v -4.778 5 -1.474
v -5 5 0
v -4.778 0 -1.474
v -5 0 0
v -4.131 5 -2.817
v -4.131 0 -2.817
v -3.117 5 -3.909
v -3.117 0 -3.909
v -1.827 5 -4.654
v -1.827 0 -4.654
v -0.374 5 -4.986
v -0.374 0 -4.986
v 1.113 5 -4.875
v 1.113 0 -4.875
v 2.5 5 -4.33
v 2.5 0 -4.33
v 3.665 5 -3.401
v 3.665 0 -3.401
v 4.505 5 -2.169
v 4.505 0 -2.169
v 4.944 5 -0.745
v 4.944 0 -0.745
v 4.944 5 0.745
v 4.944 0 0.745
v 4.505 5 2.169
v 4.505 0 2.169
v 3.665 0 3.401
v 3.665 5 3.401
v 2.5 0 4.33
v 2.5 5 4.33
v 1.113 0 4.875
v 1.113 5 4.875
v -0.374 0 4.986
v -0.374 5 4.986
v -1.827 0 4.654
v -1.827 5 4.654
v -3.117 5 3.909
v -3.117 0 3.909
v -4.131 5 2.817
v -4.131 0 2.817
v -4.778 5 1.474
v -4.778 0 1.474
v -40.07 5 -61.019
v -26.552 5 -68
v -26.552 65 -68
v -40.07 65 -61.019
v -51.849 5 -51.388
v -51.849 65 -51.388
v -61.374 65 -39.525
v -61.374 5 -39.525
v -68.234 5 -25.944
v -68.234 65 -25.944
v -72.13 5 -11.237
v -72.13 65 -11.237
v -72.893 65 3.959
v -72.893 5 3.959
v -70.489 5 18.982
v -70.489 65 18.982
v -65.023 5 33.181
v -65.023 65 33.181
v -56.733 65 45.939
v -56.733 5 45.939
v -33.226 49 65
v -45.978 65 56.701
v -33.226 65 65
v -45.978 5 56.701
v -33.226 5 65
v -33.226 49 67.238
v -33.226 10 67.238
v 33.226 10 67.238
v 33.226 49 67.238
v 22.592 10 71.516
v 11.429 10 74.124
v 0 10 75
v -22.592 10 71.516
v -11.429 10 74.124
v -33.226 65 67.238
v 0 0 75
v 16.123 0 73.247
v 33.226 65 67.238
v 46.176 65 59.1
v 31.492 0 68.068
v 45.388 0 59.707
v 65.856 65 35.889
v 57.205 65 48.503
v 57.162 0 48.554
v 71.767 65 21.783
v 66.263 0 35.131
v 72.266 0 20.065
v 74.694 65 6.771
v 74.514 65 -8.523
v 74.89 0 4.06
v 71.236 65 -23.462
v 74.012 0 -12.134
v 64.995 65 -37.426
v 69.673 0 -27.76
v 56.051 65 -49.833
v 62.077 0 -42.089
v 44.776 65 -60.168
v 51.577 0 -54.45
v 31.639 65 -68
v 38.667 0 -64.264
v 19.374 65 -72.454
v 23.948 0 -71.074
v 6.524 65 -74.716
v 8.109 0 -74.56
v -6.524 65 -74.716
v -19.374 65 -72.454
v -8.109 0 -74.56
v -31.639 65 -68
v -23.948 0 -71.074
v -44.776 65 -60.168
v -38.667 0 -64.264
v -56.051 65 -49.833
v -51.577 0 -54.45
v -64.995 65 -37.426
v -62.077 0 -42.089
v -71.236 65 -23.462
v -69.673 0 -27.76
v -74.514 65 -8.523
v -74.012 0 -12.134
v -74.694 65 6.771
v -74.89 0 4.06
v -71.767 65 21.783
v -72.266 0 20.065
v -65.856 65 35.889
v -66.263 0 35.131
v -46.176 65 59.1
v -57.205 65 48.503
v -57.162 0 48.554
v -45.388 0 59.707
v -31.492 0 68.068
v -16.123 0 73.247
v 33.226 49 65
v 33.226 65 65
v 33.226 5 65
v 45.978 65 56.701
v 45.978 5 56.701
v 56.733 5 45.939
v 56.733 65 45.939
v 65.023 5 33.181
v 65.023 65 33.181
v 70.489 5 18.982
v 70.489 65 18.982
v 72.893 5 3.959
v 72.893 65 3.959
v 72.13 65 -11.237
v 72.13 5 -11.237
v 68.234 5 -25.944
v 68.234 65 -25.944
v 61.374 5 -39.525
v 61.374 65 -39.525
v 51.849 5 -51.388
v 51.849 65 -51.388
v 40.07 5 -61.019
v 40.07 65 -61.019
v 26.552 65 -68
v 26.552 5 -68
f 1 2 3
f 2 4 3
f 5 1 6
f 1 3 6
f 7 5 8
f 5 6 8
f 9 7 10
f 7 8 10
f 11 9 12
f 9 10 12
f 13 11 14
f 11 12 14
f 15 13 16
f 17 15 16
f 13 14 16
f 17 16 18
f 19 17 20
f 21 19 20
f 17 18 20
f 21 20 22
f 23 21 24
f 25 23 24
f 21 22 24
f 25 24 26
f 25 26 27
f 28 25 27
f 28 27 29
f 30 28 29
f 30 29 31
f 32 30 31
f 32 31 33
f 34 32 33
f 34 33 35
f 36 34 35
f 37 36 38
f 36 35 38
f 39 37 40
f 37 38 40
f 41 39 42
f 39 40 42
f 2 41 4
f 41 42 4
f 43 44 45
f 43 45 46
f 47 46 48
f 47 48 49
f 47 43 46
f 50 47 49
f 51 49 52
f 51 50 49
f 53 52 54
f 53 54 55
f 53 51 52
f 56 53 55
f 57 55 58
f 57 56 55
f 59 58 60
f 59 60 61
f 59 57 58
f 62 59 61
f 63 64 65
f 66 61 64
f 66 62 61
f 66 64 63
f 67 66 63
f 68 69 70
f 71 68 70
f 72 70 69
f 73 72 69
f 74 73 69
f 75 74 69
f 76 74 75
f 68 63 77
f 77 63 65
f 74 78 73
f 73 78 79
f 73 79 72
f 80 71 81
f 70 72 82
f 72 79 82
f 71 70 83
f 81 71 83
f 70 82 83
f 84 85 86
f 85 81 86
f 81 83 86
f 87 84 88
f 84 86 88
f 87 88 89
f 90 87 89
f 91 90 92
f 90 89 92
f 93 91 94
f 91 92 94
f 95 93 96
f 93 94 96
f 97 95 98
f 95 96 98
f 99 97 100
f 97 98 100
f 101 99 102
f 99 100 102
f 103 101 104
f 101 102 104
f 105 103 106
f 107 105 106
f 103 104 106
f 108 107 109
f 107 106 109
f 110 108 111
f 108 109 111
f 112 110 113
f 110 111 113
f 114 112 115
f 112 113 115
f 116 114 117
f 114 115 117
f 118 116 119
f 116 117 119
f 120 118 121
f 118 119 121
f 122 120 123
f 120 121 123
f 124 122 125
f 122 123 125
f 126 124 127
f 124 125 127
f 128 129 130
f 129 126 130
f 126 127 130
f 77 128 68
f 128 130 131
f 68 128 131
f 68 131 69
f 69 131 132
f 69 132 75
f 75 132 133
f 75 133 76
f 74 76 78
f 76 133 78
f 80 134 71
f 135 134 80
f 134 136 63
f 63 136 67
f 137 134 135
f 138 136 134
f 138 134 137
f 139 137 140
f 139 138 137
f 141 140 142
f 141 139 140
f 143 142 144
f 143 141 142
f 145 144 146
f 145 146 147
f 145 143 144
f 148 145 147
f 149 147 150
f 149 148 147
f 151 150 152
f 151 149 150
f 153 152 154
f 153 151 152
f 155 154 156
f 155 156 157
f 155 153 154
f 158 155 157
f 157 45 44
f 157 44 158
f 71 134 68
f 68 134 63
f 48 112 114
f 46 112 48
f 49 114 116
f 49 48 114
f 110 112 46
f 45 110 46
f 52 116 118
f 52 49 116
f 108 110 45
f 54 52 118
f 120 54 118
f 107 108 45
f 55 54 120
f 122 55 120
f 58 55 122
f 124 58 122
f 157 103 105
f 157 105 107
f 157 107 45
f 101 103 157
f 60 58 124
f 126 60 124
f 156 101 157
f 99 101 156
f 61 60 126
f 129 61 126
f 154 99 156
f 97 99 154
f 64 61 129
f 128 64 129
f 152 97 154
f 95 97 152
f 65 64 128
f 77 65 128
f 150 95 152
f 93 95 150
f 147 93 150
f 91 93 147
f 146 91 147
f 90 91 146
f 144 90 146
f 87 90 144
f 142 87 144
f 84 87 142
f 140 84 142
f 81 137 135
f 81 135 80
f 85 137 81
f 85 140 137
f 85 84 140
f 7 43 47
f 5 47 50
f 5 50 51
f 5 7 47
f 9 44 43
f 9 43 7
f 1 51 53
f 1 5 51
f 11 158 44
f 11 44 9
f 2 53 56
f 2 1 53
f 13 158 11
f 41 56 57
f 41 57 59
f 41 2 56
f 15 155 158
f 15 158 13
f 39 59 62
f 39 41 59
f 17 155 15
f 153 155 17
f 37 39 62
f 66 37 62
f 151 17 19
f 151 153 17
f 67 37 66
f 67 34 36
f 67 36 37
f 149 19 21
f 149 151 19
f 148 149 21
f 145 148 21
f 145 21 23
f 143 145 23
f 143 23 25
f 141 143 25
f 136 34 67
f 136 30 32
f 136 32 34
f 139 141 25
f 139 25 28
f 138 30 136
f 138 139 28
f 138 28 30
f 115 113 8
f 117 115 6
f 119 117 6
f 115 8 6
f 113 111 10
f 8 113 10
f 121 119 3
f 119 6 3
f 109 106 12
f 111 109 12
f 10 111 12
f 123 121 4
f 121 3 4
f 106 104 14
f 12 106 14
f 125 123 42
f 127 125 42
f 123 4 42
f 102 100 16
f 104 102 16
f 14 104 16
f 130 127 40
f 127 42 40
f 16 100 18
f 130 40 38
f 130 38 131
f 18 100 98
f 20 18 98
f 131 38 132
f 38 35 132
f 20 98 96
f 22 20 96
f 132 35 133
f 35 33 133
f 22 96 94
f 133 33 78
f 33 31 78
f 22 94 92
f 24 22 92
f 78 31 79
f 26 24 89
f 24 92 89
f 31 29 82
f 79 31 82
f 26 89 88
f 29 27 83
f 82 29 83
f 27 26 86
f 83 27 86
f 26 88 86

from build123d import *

# Parameters (mm, degrees)
SKETCH1_R                  = 75
BOSS_EXTRUDE1_DEPTH        = 5
SKETCH2_R                  = 75
SKETCH2_R_2                = 73
BOSS_EXTRUDE2_DEPTH        = 60
BOSS_EXTRUDE3_START        = -60
BOSS_EXTRUDE3_DEPTH        = 60
F_10_0MM_DOWEL_HOLE1_D     = 10
F_10_0MM_DOWEL_HOLE1_DEPTH = 5
F_10_0MM_DOWEL_HOLE1_TIP   = 3.004303095
CUT_EXTRUDE1_REACH         = 173.61
CUT_EXTRUDE1_END_RADIUS    = 75
SKETCH7_W                  = 66.452990904
SKETCH7_H                  = 16
CUT_EXTRUDE2_START         = -39
CUT_EXTRUDE2_DEPTH         = 39


with BuildPart() as part:
    # Sketch1 → Boss-Extrude1 (new body)
    with BuildSketch(Plane(origin=(0, 0, 0), x_dir=(1, 0, 0), z_dir=(0, 1, 0))):
        with Locations(Location((0, 0, 0), (0, 0, 270))):
            Circle(SKETCH1_R)
    extrude(amount=BOSS_EXTRUDE1_DEPTH)

    # Sketch2 → Boss-Extrude2 (add)
    with BuildSketch(Plane(origin=(0, 5, 0), x_dir=(1, 0, 0), z_dir=(0, 1, 0))):
        with Locations(Location((0, 0, 0), (0, 0, 270))):
            Circle(SKETCH2_R)
        with Locations(Location((0, 0, 0), (0, 0, 270))):
            Circle(SKETCH2_R_2, mode=Mode.SUBTRACT)
    extrude(amount=BOSS_EXTRUDE2_DEPTH)

    # Sketch3 → Boss-Extrude3 (add)
    with BuildSketch(Plane(origin=(0, 65, 0), x_dir=(1, 0, 0), z_dir=(0, 1, 0)).offset(BOSS_EXTRUDE3_START)):
        with BuildLine():
            ThreePointArc((26.551836095, 68), (0, 73), (-26.551836095, 68))
            Line((-26.551836095, 68), (26.551836095, 68))
        make_face()
        with BuildLine():
            ThreePointArc((31.638584039, 68), (0, 75), (-31.638584039, 68))
            Line((-31.638584039, 68), (-26.551836095, 68))
            ThreePointArc((-26.551836095, 68), (0, 73), (26.551836095, 68))
            Line((26.551836095, 68), (31.638584039, 68))
        make_face()
        with BuildLine():
            Line((-33.226495452, -65), (-37.416573868, -65))
            ThreePointArc((-37.416573868, -65), (0, -75), (37.416573868, -65))
            Line((37.416573868, -65), (33.226495452, -65))
            ThreePointArc((33.226495452, -65), (0, -73), (-33.226495452, -65))
        make_face()
        with BuildLine():
            Line((33.226495452, -65), (-33.226495452, -65))
            ThreePointArc((-33.226495452, -65), (0, -73), (33.226495452, -65))
        make_face()
    extrude(amount=BOSS_EXTRUDE3_DEPTH)

    # Ø10.0mm Dowel Hole1
    with Locations(Plane(origin=(0, 5, 0), x_dir=(1, 0, 0), z_dir=(0, 1, 0))):
        with Locations((0, 0)):
            Hole(F_10_0MM_DOWEL_HOLE1_D / 2, depth=F_10_0MM_DOWEL_HOLE1_DEPTH)
            with Locations((0, 0, -(F_10_0MM_DOWEL_HOLE1_DEPTH + F_10_0MM_DOWEL_HOLE1_TIP / 2))):  # 118° drill point
                Cone(0, F_10_0MM_DOWEL_HOLE1_D / 2, F_10_0MM_DOWEL_HOLE1_TIP, mode=Mode.SUBTRACT)

    # Cut-Extrude1: up to this cylinder (the profile starts inside it)
    cut_extrude1_end = Plane(origin=(0, 57, 0), z_dir=(0, -1, 0)) * Cylinder(CUT_EXTRUDE1_END_RADIUS, 498.22, mode=Mode.PRIVATE)
    # Sketch7 → Cut-Extrude1 (cut, up to the surface)
    with BuildSketch(Plane(origin=(0, 0, 65), x_dir=(-1, 0, 0), z_dir=(0, 0, -1)), mode=Mode.PRIVATE) as cut_extrude1_sk1:
        with Locations((0, 57)):
            Rectangle(SKETCH7_W, SKETCH7_H)
    cut_extrude1_tool1 = extrude(cut_extrude1_sk1.sketch, amount=-CUT_EXTRUDE1_REACH, mode=Mode.PRIVATE) & cut_extrude1_end
    add(cut_extrude1_tool1.solids().sort_by_distance((0, 57, 65))[0], mode=Mode.SUBTRACT)

    # Sketch8 → Cut-Extrude2 (cut)
    with BuildSketch(Plane(origin=(0, 49, 0), x_dir=(1, 0, 0), z_dir=(0, 1, 0)).offset(CUT_EXTRUDE2_START)):
        with BuildLine():
            Line((-33.226495452, -67.238381896), (33.226495452, -67.238381896))
            ThreePointArc((33.226495452, -67.238381896), (0, -75), (-33.226495452, -67.238381896))
        make_face()
    extrude(amount=CUT_EXTRUDE2_DEPTH, mode=Mode.SUBTRACT)


solid = part.part
